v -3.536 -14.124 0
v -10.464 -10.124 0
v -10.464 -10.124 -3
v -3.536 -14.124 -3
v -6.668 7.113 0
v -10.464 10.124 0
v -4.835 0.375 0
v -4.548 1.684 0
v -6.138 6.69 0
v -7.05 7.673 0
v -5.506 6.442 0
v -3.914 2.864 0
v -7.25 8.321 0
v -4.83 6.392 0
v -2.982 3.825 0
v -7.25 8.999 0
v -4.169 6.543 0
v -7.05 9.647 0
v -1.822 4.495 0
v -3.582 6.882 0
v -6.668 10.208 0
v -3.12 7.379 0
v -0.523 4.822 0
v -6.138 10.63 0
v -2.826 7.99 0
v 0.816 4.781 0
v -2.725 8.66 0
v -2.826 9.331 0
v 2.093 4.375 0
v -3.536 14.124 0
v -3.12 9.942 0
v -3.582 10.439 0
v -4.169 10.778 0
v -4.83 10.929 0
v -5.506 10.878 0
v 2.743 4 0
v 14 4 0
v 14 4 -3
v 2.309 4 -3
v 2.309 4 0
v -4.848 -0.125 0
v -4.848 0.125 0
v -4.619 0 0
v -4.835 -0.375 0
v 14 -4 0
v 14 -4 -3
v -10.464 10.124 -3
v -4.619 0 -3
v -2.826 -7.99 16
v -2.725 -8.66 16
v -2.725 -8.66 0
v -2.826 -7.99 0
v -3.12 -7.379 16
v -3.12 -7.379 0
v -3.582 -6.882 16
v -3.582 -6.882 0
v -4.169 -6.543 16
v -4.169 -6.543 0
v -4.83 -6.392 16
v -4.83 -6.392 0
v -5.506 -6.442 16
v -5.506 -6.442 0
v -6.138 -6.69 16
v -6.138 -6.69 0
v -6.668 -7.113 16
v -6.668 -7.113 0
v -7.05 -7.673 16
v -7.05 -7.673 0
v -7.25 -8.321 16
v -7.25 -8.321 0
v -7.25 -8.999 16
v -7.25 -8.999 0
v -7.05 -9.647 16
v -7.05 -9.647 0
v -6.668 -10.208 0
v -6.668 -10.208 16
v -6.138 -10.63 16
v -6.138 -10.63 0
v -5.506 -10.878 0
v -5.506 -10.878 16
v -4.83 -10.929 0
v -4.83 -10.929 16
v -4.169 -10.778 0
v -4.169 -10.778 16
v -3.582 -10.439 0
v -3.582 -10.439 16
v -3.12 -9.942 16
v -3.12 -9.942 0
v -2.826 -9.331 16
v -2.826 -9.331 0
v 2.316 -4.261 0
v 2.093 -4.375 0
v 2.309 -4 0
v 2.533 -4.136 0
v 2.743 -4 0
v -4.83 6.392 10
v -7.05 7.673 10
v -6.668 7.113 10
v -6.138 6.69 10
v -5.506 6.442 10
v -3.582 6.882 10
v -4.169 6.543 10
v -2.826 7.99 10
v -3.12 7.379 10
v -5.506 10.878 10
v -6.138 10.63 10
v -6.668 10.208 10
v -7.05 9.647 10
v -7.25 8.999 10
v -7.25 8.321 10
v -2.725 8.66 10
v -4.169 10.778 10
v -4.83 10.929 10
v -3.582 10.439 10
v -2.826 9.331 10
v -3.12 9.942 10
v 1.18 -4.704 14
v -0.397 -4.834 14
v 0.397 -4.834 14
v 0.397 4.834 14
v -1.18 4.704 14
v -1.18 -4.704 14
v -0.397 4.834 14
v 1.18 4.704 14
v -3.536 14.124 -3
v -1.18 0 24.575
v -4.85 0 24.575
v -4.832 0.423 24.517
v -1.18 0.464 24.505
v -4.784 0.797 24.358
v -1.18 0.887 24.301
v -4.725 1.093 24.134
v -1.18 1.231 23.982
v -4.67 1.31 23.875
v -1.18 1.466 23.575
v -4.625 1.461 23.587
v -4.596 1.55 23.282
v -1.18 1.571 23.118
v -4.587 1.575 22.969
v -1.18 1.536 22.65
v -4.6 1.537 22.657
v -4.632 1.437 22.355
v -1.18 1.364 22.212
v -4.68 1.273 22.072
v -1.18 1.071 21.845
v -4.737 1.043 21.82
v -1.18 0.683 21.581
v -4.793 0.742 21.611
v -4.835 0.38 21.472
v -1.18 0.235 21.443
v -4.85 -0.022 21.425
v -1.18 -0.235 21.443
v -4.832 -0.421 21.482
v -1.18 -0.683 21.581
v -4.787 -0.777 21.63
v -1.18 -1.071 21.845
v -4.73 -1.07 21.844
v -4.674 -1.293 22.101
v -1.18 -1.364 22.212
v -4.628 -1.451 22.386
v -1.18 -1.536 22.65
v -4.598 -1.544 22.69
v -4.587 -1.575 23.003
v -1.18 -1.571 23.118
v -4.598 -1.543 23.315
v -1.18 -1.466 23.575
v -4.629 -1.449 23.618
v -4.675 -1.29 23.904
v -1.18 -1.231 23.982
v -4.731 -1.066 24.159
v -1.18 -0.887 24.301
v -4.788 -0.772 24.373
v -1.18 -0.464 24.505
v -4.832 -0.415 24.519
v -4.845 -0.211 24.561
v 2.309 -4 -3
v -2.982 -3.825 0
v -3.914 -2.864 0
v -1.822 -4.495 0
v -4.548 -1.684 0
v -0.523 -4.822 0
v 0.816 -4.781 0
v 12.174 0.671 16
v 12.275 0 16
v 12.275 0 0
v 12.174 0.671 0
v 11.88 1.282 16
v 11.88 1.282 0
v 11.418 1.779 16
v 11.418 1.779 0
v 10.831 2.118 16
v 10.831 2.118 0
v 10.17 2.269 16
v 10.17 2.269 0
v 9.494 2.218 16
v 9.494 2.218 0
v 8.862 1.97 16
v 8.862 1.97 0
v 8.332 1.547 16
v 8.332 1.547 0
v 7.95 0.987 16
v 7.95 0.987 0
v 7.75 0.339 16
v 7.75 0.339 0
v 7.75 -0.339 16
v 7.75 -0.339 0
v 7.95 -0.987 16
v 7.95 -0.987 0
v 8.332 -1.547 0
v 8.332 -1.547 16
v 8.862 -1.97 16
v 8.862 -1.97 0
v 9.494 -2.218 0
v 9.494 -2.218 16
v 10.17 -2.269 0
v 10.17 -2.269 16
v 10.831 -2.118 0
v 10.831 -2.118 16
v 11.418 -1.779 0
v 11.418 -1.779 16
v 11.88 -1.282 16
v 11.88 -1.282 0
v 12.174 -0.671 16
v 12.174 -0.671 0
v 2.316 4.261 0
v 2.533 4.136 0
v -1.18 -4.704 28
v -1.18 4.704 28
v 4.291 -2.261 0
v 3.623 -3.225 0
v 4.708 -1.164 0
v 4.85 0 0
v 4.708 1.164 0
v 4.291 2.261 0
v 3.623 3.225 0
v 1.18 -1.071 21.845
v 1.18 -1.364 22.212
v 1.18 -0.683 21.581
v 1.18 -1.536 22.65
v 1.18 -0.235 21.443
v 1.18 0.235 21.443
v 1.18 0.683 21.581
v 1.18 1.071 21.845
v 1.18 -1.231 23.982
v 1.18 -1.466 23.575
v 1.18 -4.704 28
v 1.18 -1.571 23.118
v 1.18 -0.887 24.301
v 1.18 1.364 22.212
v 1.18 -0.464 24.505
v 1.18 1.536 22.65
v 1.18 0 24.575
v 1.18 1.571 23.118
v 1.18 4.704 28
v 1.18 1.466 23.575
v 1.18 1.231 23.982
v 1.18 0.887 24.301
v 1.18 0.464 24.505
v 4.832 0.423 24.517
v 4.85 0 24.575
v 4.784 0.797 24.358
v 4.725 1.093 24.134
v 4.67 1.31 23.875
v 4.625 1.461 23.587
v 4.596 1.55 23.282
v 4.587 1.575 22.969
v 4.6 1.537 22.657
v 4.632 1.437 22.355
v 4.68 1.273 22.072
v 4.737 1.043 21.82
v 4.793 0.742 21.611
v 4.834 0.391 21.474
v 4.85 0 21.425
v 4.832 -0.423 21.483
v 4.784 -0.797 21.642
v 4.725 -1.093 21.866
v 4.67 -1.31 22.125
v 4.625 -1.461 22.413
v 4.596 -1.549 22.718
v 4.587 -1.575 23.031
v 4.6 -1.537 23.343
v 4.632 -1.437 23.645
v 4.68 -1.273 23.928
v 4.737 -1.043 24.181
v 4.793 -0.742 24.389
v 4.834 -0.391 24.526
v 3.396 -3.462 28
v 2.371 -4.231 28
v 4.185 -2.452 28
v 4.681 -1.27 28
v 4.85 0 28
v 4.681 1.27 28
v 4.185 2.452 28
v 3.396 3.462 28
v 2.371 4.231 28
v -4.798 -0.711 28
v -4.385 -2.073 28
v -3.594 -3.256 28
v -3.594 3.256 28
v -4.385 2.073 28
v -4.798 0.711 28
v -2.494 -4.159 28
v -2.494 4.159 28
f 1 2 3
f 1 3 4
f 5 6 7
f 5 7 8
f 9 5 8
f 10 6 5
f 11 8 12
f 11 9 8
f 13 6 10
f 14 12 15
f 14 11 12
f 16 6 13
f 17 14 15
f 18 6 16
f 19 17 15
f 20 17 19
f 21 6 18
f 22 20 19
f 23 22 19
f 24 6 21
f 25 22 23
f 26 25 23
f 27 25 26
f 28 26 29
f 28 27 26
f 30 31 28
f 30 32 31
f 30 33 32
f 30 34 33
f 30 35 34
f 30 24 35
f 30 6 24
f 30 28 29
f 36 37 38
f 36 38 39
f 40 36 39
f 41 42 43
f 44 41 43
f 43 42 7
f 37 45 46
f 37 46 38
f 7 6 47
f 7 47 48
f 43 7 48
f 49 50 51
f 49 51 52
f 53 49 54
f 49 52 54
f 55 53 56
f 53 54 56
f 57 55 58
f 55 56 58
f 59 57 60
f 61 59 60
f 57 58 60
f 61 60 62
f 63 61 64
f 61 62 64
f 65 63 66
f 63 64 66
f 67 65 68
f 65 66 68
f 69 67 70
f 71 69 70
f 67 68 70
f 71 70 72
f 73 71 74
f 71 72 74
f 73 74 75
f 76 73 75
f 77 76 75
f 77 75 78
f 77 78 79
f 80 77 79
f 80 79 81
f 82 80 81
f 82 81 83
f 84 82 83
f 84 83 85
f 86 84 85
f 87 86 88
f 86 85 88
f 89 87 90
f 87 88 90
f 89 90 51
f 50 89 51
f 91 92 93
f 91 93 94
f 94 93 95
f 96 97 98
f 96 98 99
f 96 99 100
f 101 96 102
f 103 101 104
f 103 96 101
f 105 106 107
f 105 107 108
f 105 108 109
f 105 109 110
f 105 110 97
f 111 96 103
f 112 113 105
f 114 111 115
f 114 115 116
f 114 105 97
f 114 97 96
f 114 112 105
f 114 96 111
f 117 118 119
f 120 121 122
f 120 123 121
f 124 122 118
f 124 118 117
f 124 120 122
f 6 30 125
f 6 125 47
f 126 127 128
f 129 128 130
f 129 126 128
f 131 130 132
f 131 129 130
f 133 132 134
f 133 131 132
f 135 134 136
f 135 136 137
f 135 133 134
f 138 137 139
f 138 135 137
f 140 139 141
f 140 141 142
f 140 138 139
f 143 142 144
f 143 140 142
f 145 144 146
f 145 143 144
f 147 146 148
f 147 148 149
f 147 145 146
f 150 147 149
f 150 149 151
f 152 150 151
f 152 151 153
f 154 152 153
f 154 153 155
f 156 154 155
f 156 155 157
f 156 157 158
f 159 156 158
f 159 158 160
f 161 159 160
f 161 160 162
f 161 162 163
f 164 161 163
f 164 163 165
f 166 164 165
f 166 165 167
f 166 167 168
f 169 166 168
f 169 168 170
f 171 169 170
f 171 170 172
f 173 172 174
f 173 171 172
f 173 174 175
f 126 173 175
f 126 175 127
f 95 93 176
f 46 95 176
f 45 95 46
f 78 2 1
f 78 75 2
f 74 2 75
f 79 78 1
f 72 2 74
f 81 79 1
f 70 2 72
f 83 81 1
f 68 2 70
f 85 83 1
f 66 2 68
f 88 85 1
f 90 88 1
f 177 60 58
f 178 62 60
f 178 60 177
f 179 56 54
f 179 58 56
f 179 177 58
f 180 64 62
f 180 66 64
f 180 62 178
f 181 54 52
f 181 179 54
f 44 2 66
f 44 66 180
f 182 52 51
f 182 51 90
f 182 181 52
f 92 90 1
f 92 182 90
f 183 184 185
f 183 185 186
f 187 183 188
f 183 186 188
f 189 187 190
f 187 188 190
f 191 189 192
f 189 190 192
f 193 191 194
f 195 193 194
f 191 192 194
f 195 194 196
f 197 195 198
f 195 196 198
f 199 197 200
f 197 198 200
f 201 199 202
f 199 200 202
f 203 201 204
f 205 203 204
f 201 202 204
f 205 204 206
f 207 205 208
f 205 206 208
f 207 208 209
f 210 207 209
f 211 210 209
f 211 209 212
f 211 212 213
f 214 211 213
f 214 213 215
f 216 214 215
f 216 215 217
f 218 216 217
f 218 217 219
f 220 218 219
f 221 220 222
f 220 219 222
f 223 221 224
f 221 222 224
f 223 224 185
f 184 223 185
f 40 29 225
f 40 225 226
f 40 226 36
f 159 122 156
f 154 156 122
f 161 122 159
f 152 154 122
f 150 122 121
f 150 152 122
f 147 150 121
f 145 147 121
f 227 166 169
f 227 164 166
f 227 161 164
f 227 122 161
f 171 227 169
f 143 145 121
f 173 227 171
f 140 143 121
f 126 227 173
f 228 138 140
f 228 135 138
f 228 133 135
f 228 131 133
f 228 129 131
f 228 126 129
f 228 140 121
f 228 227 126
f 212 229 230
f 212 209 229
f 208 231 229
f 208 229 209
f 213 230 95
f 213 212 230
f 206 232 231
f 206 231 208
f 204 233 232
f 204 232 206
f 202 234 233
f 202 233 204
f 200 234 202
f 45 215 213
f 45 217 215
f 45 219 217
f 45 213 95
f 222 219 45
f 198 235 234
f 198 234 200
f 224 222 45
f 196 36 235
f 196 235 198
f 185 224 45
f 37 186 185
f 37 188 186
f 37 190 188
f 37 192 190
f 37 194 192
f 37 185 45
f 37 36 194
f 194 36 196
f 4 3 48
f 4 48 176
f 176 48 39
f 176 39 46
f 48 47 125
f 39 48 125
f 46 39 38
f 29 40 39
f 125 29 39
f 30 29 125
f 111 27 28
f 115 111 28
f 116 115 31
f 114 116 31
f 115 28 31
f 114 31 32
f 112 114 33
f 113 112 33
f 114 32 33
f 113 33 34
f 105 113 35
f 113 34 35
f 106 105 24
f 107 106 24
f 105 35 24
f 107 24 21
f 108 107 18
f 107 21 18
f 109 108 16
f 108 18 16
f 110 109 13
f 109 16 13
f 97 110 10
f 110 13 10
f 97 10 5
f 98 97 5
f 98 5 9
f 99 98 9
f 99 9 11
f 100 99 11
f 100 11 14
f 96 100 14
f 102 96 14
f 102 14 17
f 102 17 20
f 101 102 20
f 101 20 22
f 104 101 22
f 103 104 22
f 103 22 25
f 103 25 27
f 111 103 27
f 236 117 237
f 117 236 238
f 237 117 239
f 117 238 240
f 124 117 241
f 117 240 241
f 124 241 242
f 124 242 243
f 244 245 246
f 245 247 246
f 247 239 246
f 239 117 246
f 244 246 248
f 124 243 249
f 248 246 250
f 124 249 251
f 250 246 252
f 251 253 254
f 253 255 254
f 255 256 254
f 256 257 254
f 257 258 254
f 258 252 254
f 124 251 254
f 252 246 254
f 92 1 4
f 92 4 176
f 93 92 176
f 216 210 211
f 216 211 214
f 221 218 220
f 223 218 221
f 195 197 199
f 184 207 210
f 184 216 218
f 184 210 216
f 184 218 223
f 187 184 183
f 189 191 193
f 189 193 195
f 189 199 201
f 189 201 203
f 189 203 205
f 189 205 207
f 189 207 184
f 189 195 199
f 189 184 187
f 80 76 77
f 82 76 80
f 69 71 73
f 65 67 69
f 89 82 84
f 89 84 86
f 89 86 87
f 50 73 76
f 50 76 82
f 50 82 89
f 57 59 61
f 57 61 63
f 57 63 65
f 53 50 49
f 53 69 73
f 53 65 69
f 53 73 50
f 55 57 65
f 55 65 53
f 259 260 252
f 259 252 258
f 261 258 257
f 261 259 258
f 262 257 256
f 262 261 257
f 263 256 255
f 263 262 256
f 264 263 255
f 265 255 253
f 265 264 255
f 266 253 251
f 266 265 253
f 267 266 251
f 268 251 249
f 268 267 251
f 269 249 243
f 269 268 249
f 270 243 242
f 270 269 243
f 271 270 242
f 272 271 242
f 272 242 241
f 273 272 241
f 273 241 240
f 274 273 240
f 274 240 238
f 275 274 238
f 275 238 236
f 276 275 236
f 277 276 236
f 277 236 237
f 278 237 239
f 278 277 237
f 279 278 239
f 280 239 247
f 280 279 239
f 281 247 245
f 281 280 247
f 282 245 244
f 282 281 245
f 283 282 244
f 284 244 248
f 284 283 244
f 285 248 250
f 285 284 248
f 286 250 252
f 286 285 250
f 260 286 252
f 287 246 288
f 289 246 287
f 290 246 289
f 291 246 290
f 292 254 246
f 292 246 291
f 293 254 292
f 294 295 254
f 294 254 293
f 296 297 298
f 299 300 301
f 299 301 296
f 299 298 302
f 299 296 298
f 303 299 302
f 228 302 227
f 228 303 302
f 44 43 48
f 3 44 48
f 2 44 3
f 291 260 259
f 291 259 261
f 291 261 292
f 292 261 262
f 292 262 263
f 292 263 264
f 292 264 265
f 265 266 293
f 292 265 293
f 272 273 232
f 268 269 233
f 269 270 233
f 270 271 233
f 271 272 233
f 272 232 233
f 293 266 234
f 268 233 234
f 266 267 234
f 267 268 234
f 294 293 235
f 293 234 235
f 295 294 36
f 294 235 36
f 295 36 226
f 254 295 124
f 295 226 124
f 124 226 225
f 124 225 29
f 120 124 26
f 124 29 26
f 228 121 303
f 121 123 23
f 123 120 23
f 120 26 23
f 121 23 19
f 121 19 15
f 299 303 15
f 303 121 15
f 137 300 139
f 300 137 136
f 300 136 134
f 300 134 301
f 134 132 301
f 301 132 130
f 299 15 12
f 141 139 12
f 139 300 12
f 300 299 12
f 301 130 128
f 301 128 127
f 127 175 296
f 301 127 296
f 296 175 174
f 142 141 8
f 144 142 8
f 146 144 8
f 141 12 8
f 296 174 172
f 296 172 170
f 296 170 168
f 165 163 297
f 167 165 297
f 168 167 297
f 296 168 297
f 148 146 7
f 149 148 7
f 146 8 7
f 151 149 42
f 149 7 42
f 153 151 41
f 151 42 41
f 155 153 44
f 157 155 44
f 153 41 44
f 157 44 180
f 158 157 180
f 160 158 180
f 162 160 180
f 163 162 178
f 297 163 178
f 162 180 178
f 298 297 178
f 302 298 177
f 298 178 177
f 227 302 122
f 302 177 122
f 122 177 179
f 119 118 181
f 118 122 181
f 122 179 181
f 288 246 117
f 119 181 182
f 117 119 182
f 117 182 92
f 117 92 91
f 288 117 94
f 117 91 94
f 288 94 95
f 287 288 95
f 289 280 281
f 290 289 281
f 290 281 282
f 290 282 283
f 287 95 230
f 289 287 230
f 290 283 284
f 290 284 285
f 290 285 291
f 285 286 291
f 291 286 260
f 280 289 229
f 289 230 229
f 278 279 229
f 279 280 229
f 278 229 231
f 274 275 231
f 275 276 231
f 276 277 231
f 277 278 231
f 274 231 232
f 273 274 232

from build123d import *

# Parameters (mm, degrees)
SKETCH1_R               = 4.85
BOSS_EXTRUDE1_DEPTH     = 28
SKETCH2_W               = 2.36
SKETCH2_H               = 10
CUT_EXTRUDE1_DEPTH      = 14
CUT_EXTRUDE2_DEPTH      = 30.049671255
CUT_EXTRUDE2_DEPTH_BACK = 30.049671255
SKETCH3_R               = 1.575
BOSS_EXTRUDE2_DEPTH     = 3
SKETCH6_R               = 2.275
BOSS_EXTRUDE3_DEPTH     = 16
CUT_EXTRUDE3_START      = -6
SKETCH7_R               = 2.275
CUT_EXTRUDE3_DEPTH      = 6


with BuildPart() as part:
    # Sketch1 → Boss-Extrude1 (new body)
    with BuildSketch(Plane.XY):
        Circle(SKETCH1_R)
    extrude(amount=BOSS_EXTRUDE1_DEPTH)

    # Sketch2 → Cut-Extrude1 (cut)
    with BuildSketch(Plane.XY.offset(28)):
        Rectangle(SKETCH2_W, SKETCH2_H)
    extrude(amount=-CUT_EXTRUDE1_DEPTH, mode=Mode.SUBTRACT)

    # Sketch3 → Cut-Extrude2 (cut, two sides: drawn at the far end of the back side and taken through both)
    with BuildSketch(Plane.ZY.offset(-1.18).offset(-CUT_EXTRUDE2_DEPTH_BACK)):
        with Locations((23, 0)):
            Circle(SKETCH3_R)
    extrude(amount=CUT_EXTRUDE2_DEPTH + CUT_EXTRUDE2_DEPTH_BACK, mode=Mode.SUBTRACT)

    # Sketch5 → Boss-Extrude2 (add)
    with BuildSketch(Plane(origin=(0, 0, 0), x_dir=(-1, 0, 0), z_dir=(0, 0, -1))):
        Polygon((-2.309401077, -4), (-14, -4), (-14, 4), (-2.309401077, 4), (3.535898385, 14.124355653), (10.464101615, 10.124355653), (4.618802154, 0), (10.464101615, -10.124355653), (3.535898385, -14.124355653), align=None)
    extrude(amount=BOSS_EXTRUDE2_DEPTH)

    # Sketch6 → Boss-Extrude3 (add)
    with BuildSketch(Plane.XY):
        with Locations((-5, 8.660254038)):
            Circle(SKETCH6_R)
        with Locations((-5, -8.660254038)):
            Circle(SKETCH6_R)
        with Locations((10, 0)):
            Circle(SKETCH6_R)
    extrude(amount=BOSS_EXTRUDE3_DEPTH)

    # Sketch7 → Cut-Extrude3 (cut)
    with BuildSketch(Plane.XY.offset(16).offset(CUT_EXTRUDE3_START)):
        with Locations((-5, 8.660254038)):
            Circle(SKETCH7_R)
    extrude(amount=CUT_EXTRUDE3_DEPTH, mode=Mode.SUBTRACT)


solid = part.part
